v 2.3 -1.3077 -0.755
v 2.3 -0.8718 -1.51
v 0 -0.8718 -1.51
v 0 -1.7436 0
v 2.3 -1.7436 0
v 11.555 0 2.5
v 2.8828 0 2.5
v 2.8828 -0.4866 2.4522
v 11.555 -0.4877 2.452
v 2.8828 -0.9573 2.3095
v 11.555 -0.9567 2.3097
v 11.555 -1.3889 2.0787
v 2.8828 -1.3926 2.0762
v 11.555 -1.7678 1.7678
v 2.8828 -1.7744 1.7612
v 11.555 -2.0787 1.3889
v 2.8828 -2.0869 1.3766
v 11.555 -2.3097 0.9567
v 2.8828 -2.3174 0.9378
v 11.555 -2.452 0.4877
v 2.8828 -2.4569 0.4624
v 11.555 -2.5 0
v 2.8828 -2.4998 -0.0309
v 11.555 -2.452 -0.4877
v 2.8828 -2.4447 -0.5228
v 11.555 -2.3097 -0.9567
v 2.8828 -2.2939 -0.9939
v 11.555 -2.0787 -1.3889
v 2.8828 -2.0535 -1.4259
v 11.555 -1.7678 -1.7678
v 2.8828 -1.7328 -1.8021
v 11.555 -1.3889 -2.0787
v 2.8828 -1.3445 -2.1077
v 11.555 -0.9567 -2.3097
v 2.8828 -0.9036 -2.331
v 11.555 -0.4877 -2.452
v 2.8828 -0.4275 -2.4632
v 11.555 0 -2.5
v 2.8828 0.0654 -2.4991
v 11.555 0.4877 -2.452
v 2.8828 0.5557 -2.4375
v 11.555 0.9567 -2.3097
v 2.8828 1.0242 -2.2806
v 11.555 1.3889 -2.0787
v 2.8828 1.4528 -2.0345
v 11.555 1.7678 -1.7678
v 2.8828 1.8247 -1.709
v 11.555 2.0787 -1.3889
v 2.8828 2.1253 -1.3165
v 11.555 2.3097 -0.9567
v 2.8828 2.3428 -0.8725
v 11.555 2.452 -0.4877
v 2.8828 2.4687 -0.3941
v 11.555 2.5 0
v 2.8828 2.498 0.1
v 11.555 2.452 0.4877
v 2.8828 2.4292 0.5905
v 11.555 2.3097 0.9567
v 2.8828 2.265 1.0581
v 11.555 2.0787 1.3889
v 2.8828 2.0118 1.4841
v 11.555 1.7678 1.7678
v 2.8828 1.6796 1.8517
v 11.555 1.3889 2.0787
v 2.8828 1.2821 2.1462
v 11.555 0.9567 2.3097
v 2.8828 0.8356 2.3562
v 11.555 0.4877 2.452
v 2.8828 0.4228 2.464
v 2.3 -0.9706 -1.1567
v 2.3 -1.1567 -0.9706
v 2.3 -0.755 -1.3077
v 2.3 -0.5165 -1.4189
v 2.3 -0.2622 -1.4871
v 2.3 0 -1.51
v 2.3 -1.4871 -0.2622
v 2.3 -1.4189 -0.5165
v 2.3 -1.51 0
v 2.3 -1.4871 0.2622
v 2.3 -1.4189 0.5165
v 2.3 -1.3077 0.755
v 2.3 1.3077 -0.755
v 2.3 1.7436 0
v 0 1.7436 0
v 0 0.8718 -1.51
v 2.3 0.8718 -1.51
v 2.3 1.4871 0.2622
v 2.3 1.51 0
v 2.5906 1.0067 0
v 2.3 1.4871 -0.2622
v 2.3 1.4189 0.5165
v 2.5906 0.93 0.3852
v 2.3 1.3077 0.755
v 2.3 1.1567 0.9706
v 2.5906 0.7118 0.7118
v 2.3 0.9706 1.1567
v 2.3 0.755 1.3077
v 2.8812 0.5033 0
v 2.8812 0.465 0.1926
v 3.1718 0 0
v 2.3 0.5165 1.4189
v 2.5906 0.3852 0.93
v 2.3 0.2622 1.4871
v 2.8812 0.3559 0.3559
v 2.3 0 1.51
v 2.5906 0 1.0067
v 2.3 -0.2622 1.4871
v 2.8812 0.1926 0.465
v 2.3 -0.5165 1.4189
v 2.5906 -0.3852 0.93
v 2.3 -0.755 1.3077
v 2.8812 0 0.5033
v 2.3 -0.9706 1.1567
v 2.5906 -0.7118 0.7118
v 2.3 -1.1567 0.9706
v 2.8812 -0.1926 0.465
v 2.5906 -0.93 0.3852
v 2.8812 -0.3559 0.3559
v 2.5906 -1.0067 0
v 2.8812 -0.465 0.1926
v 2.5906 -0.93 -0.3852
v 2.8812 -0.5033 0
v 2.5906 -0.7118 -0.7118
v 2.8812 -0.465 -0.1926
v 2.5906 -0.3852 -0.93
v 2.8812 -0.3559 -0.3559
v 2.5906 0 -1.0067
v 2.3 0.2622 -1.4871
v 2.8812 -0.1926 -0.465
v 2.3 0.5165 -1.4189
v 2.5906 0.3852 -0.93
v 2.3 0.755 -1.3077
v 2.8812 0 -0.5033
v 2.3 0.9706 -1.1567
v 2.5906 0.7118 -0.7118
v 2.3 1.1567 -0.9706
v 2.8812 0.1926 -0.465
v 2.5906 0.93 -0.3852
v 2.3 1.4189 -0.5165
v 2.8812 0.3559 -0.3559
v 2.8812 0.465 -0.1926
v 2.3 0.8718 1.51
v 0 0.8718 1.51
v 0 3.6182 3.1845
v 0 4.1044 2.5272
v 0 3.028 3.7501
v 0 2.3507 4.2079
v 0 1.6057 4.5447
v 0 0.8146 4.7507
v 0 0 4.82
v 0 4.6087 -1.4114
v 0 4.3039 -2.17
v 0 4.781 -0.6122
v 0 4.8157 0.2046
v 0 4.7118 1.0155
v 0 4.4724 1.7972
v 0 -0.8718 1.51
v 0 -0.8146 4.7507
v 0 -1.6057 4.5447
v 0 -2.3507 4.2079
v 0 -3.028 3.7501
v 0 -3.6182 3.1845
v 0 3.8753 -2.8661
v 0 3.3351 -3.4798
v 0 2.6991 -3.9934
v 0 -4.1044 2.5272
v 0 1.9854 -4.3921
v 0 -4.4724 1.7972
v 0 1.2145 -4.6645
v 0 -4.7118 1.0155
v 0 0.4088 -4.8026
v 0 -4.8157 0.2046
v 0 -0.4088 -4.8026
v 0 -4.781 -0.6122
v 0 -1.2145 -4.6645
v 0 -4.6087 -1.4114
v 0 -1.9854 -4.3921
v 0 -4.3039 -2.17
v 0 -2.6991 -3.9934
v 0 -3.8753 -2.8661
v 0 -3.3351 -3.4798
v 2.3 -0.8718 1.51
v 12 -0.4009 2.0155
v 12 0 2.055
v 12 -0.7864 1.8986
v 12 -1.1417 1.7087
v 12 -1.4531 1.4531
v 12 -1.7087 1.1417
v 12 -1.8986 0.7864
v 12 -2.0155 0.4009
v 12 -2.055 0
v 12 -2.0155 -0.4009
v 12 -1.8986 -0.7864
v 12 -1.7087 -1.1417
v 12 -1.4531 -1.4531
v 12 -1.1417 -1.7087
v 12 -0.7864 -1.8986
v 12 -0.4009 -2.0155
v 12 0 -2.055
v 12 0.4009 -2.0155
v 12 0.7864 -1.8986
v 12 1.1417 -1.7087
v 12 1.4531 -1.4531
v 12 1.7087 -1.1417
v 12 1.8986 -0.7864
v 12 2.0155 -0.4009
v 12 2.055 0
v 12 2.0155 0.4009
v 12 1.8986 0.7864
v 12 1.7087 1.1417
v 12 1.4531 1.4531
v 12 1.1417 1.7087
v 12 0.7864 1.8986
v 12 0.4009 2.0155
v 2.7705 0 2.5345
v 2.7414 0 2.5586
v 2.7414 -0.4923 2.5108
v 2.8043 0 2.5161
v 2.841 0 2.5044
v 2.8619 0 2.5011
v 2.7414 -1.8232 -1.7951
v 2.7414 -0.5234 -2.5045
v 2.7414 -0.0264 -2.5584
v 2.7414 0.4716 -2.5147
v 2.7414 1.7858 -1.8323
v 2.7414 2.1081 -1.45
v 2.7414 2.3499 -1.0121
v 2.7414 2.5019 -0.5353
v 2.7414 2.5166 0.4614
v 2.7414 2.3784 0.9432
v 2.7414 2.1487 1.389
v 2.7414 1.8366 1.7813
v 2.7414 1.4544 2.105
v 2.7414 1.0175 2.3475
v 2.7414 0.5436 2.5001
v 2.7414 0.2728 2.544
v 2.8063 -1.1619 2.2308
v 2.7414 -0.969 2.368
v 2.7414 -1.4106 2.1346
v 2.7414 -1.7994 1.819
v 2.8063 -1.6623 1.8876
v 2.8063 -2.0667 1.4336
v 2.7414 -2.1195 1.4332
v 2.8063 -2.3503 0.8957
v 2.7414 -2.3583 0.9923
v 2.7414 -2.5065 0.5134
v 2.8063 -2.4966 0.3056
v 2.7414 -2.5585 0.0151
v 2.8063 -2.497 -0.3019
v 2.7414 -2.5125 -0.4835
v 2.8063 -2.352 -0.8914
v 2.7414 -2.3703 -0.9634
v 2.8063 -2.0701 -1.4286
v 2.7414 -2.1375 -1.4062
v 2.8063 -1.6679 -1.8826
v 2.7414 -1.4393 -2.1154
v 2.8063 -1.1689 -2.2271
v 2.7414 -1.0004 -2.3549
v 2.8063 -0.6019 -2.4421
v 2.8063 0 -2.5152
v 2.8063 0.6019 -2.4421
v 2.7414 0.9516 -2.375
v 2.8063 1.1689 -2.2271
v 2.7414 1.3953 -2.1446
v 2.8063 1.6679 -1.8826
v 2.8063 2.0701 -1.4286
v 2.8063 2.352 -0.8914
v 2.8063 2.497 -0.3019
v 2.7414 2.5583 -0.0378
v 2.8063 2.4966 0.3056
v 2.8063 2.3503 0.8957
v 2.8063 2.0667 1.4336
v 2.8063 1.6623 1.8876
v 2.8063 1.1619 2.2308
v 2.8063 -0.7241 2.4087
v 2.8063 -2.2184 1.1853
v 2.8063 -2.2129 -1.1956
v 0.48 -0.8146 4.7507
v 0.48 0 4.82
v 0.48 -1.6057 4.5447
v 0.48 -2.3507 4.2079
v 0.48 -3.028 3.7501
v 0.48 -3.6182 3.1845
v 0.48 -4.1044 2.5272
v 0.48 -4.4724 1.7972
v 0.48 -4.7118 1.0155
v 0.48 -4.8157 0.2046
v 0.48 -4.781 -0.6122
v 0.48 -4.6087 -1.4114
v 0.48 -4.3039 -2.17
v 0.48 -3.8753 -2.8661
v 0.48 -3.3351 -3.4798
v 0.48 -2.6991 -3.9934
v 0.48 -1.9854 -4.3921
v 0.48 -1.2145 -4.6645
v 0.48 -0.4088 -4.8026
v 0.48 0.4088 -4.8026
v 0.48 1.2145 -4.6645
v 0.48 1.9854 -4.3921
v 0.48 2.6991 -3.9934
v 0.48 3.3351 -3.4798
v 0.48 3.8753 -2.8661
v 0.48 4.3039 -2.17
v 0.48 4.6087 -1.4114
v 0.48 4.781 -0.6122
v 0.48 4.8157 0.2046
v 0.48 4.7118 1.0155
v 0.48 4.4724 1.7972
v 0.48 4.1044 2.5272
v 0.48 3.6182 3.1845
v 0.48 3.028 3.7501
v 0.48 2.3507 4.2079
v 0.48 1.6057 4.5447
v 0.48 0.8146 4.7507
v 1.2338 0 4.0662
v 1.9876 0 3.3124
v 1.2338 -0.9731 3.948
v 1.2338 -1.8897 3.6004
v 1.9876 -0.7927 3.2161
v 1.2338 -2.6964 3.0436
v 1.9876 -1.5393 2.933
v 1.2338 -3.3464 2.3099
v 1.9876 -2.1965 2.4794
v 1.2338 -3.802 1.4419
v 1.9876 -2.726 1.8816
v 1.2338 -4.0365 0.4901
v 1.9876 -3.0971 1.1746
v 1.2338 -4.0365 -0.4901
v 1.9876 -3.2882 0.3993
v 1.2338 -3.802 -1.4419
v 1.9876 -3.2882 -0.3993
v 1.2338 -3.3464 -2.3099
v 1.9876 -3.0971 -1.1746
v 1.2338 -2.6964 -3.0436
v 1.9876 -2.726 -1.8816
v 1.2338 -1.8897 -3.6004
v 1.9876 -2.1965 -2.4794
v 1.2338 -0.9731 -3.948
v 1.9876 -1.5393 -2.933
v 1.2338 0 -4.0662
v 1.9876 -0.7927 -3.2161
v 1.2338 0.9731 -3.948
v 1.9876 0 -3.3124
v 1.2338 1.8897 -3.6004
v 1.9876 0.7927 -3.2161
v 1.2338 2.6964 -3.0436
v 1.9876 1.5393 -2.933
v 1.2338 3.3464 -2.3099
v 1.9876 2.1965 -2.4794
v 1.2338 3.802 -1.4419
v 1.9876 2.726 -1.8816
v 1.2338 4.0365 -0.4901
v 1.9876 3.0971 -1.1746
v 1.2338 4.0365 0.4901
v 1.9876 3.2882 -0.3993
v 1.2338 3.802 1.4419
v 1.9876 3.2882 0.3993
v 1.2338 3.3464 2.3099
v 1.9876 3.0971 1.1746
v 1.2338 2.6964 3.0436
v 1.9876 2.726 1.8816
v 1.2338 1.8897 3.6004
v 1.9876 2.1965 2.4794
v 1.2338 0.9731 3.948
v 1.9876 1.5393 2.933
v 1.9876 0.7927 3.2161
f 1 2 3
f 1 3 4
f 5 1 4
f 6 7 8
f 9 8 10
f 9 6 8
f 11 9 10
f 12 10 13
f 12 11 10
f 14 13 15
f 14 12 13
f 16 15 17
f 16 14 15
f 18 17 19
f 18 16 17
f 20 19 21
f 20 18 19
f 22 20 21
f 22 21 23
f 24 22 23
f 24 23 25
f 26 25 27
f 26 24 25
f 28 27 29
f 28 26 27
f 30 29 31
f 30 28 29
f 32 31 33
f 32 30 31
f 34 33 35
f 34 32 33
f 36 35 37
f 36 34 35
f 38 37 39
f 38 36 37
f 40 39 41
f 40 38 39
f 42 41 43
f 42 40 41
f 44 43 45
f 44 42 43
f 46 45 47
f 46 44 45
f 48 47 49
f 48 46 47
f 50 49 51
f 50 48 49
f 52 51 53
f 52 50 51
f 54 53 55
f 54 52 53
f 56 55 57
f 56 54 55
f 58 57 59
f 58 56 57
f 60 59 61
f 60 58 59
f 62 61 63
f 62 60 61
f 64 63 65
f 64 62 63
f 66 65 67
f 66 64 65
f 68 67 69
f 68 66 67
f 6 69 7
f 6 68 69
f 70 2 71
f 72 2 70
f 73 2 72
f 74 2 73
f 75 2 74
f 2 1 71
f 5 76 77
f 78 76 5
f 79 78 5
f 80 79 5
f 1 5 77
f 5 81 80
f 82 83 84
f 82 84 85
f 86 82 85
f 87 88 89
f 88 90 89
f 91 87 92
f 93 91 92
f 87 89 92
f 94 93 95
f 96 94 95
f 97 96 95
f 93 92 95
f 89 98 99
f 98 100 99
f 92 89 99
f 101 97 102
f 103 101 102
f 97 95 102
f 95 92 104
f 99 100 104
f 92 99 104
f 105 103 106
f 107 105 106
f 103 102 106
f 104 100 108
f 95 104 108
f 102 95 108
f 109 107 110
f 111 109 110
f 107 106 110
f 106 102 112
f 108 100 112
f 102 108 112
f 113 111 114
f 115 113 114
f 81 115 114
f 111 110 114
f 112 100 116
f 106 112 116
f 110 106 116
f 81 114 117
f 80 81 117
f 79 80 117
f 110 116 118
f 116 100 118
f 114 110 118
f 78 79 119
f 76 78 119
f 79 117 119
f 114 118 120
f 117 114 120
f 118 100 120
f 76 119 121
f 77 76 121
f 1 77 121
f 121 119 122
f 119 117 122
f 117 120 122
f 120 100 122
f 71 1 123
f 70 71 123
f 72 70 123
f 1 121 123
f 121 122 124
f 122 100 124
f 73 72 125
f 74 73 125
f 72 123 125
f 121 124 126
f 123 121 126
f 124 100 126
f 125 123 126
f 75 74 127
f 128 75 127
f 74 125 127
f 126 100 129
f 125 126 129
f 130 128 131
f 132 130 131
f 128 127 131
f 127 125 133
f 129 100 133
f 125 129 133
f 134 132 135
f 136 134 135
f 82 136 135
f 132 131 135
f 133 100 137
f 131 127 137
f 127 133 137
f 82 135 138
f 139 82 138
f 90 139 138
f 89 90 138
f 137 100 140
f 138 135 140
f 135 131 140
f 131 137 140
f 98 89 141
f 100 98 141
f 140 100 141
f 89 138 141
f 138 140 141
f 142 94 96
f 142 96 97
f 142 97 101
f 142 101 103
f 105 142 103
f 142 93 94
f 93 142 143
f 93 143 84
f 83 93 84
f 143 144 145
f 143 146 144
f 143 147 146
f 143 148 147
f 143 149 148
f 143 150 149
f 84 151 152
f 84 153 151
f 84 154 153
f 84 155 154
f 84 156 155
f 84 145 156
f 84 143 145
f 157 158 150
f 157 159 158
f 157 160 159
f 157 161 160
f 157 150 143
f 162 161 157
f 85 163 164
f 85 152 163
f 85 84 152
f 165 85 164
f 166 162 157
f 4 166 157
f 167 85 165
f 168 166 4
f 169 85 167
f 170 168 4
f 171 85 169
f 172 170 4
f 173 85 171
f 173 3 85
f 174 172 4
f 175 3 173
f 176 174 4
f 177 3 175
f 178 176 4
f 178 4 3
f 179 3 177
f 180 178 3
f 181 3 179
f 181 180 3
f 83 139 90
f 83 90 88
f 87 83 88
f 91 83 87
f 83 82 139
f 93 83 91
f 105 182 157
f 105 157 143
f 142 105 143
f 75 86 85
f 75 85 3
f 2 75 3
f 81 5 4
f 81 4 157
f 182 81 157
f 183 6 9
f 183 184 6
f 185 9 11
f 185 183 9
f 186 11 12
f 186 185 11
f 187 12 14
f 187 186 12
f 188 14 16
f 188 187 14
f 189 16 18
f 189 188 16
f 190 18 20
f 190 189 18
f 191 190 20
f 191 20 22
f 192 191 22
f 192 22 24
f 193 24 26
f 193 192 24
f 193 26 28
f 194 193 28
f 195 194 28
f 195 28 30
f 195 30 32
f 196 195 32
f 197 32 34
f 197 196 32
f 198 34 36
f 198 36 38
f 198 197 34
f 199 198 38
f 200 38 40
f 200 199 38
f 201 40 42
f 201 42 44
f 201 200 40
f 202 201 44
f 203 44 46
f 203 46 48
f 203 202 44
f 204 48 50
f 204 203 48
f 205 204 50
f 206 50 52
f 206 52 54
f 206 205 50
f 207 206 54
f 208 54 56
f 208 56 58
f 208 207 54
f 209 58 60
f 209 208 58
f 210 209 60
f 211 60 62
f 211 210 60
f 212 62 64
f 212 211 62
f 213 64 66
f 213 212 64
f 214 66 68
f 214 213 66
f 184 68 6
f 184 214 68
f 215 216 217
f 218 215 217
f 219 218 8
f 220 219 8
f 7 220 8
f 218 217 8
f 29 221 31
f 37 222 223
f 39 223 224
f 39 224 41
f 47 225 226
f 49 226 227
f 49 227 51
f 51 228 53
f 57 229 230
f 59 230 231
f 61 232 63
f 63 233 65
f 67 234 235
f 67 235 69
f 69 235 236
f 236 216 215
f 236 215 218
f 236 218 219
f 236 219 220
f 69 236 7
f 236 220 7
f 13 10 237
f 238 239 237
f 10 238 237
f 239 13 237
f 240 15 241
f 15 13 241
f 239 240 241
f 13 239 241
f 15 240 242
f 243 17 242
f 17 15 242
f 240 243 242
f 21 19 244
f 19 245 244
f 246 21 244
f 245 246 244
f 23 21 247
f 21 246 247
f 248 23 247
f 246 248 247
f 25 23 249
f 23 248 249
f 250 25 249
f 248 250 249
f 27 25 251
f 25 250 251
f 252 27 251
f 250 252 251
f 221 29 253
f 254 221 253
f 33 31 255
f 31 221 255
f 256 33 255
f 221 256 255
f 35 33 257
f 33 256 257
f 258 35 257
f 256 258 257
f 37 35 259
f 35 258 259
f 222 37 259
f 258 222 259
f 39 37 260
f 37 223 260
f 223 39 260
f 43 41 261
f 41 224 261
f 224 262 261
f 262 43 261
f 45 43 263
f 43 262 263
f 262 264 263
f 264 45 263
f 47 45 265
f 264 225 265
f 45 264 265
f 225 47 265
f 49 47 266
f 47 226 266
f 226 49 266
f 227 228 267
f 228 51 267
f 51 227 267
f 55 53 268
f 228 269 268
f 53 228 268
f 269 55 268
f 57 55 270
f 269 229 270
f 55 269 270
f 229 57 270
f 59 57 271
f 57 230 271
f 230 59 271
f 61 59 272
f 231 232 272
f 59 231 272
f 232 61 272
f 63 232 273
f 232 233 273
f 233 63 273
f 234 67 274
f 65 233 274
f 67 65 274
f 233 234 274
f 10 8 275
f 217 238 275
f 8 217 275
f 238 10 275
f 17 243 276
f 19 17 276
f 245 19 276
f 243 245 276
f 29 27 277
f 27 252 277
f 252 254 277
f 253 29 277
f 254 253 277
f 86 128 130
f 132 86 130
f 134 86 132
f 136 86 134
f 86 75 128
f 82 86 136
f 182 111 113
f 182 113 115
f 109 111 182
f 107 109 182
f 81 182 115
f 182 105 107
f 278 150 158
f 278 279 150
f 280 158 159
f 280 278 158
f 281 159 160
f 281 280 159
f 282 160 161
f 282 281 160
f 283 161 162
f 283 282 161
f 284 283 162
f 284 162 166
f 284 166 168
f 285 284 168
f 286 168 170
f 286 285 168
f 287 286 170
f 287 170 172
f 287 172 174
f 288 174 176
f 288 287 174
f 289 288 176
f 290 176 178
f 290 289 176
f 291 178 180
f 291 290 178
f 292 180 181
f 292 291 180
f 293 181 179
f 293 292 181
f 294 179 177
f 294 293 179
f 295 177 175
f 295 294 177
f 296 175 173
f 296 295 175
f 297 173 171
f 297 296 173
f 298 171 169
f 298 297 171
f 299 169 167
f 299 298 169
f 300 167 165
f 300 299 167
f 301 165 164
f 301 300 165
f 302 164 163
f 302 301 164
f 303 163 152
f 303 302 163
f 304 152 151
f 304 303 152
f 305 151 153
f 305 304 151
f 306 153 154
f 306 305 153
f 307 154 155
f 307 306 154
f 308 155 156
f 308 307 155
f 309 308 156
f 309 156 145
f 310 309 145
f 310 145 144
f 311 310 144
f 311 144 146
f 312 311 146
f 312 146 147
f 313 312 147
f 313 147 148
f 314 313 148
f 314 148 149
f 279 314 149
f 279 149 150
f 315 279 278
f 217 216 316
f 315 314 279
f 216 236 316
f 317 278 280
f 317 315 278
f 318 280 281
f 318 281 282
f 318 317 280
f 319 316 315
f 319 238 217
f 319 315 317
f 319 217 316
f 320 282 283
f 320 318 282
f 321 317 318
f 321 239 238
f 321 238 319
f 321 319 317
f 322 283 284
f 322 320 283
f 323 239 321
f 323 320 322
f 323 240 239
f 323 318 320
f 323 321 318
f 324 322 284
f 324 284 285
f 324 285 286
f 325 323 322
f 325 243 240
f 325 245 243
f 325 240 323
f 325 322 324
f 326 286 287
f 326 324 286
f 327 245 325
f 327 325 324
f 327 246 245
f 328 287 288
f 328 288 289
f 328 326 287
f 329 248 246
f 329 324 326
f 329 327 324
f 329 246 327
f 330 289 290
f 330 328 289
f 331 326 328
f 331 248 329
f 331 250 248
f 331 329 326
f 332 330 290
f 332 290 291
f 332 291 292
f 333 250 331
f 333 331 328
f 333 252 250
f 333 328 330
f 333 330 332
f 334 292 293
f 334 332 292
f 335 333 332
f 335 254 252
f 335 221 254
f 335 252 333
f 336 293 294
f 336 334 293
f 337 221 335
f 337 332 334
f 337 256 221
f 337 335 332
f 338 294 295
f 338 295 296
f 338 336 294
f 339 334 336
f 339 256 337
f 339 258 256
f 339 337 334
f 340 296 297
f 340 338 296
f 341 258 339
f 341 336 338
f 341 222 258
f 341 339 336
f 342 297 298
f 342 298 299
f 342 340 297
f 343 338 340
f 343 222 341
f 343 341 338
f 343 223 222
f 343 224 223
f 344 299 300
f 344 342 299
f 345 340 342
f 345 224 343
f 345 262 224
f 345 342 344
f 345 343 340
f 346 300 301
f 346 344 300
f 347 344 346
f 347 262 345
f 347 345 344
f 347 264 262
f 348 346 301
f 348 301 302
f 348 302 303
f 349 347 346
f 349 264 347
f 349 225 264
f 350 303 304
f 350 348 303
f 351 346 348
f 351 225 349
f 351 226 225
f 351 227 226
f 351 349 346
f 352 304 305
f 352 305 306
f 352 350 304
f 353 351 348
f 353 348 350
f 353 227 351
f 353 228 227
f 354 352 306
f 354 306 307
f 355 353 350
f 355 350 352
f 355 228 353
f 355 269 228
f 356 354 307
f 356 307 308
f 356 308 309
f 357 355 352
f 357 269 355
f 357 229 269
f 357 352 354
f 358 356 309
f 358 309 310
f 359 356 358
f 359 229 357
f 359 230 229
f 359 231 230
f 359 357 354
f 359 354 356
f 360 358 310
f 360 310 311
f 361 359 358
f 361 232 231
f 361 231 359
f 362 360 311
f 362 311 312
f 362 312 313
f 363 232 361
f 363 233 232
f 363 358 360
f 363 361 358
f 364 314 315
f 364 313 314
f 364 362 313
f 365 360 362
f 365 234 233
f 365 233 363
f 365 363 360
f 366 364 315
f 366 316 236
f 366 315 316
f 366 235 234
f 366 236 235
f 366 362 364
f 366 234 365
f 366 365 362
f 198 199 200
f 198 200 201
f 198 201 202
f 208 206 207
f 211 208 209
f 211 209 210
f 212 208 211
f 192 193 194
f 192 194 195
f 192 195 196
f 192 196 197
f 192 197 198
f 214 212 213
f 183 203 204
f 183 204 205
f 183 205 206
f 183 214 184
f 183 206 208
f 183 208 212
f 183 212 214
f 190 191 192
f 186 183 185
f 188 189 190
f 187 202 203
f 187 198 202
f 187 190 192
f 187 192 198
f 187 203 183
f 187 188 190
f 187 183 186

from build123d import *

# Parameters (mm, degrees)
FILLET1_R   = 0.2
HEX_START   = -2.3
HEX_2_DEPTH = 2.3


with BuildPart() as part:
    # BodySke → BaseBody (revolve)
    with BuildSketch(Plane.XY, mode=Mode.PRIVATE) as basebody_sk:
        Polygon((0, 0), (0, 4.82), (0.48, 4.82), (2.8, 2.5), (11.555, 2.5), (12, 2.055), (12, 0), align=None)
    revolve(basebody_sk.sketch.rotate(Axis((0, 0, 0), (1, 0, 0)), 90), axis=Axis((0, 0, 0), (1, 0, 0)))

    # Fillet1
    fillet1_edges = [part.edges().sort_by_distance(p)[0] for p in [
        (2.8, 0, -2.5),
    ]]
    fillet(fillet1_edges, radius=FILLET1_R)

    # Hex 2: read off the stored shape, not the designer's step
    # Hex 2 outline → Hex 2 (cut)
    with BuildSketch(Plane.ZY.offset(HEX_START)):
        Polygon((-1.51, -0.871798906), (0, -1.743597813), (1.51, -0.871798906), (1.51, 0.871798906), (0, 1.743597813), (-1.51, 0.871798906), align=None)
    extrude(amount=HEX_2_DEPTH, mode=Mode.SUBTRACT)

    # Hex 2 2 outline → Hex 2 2 (revolve, cut)
    with BuildSketch(Plane.YX):
        Polygon((1.51, 2.3), (0, 3.171798906), (0, 2.3), align=None)
    revolve(axis=Axis((0, 0, 0), (1, 0, 0)), mode=Mode.SUBTRACT)


solid = part.part
